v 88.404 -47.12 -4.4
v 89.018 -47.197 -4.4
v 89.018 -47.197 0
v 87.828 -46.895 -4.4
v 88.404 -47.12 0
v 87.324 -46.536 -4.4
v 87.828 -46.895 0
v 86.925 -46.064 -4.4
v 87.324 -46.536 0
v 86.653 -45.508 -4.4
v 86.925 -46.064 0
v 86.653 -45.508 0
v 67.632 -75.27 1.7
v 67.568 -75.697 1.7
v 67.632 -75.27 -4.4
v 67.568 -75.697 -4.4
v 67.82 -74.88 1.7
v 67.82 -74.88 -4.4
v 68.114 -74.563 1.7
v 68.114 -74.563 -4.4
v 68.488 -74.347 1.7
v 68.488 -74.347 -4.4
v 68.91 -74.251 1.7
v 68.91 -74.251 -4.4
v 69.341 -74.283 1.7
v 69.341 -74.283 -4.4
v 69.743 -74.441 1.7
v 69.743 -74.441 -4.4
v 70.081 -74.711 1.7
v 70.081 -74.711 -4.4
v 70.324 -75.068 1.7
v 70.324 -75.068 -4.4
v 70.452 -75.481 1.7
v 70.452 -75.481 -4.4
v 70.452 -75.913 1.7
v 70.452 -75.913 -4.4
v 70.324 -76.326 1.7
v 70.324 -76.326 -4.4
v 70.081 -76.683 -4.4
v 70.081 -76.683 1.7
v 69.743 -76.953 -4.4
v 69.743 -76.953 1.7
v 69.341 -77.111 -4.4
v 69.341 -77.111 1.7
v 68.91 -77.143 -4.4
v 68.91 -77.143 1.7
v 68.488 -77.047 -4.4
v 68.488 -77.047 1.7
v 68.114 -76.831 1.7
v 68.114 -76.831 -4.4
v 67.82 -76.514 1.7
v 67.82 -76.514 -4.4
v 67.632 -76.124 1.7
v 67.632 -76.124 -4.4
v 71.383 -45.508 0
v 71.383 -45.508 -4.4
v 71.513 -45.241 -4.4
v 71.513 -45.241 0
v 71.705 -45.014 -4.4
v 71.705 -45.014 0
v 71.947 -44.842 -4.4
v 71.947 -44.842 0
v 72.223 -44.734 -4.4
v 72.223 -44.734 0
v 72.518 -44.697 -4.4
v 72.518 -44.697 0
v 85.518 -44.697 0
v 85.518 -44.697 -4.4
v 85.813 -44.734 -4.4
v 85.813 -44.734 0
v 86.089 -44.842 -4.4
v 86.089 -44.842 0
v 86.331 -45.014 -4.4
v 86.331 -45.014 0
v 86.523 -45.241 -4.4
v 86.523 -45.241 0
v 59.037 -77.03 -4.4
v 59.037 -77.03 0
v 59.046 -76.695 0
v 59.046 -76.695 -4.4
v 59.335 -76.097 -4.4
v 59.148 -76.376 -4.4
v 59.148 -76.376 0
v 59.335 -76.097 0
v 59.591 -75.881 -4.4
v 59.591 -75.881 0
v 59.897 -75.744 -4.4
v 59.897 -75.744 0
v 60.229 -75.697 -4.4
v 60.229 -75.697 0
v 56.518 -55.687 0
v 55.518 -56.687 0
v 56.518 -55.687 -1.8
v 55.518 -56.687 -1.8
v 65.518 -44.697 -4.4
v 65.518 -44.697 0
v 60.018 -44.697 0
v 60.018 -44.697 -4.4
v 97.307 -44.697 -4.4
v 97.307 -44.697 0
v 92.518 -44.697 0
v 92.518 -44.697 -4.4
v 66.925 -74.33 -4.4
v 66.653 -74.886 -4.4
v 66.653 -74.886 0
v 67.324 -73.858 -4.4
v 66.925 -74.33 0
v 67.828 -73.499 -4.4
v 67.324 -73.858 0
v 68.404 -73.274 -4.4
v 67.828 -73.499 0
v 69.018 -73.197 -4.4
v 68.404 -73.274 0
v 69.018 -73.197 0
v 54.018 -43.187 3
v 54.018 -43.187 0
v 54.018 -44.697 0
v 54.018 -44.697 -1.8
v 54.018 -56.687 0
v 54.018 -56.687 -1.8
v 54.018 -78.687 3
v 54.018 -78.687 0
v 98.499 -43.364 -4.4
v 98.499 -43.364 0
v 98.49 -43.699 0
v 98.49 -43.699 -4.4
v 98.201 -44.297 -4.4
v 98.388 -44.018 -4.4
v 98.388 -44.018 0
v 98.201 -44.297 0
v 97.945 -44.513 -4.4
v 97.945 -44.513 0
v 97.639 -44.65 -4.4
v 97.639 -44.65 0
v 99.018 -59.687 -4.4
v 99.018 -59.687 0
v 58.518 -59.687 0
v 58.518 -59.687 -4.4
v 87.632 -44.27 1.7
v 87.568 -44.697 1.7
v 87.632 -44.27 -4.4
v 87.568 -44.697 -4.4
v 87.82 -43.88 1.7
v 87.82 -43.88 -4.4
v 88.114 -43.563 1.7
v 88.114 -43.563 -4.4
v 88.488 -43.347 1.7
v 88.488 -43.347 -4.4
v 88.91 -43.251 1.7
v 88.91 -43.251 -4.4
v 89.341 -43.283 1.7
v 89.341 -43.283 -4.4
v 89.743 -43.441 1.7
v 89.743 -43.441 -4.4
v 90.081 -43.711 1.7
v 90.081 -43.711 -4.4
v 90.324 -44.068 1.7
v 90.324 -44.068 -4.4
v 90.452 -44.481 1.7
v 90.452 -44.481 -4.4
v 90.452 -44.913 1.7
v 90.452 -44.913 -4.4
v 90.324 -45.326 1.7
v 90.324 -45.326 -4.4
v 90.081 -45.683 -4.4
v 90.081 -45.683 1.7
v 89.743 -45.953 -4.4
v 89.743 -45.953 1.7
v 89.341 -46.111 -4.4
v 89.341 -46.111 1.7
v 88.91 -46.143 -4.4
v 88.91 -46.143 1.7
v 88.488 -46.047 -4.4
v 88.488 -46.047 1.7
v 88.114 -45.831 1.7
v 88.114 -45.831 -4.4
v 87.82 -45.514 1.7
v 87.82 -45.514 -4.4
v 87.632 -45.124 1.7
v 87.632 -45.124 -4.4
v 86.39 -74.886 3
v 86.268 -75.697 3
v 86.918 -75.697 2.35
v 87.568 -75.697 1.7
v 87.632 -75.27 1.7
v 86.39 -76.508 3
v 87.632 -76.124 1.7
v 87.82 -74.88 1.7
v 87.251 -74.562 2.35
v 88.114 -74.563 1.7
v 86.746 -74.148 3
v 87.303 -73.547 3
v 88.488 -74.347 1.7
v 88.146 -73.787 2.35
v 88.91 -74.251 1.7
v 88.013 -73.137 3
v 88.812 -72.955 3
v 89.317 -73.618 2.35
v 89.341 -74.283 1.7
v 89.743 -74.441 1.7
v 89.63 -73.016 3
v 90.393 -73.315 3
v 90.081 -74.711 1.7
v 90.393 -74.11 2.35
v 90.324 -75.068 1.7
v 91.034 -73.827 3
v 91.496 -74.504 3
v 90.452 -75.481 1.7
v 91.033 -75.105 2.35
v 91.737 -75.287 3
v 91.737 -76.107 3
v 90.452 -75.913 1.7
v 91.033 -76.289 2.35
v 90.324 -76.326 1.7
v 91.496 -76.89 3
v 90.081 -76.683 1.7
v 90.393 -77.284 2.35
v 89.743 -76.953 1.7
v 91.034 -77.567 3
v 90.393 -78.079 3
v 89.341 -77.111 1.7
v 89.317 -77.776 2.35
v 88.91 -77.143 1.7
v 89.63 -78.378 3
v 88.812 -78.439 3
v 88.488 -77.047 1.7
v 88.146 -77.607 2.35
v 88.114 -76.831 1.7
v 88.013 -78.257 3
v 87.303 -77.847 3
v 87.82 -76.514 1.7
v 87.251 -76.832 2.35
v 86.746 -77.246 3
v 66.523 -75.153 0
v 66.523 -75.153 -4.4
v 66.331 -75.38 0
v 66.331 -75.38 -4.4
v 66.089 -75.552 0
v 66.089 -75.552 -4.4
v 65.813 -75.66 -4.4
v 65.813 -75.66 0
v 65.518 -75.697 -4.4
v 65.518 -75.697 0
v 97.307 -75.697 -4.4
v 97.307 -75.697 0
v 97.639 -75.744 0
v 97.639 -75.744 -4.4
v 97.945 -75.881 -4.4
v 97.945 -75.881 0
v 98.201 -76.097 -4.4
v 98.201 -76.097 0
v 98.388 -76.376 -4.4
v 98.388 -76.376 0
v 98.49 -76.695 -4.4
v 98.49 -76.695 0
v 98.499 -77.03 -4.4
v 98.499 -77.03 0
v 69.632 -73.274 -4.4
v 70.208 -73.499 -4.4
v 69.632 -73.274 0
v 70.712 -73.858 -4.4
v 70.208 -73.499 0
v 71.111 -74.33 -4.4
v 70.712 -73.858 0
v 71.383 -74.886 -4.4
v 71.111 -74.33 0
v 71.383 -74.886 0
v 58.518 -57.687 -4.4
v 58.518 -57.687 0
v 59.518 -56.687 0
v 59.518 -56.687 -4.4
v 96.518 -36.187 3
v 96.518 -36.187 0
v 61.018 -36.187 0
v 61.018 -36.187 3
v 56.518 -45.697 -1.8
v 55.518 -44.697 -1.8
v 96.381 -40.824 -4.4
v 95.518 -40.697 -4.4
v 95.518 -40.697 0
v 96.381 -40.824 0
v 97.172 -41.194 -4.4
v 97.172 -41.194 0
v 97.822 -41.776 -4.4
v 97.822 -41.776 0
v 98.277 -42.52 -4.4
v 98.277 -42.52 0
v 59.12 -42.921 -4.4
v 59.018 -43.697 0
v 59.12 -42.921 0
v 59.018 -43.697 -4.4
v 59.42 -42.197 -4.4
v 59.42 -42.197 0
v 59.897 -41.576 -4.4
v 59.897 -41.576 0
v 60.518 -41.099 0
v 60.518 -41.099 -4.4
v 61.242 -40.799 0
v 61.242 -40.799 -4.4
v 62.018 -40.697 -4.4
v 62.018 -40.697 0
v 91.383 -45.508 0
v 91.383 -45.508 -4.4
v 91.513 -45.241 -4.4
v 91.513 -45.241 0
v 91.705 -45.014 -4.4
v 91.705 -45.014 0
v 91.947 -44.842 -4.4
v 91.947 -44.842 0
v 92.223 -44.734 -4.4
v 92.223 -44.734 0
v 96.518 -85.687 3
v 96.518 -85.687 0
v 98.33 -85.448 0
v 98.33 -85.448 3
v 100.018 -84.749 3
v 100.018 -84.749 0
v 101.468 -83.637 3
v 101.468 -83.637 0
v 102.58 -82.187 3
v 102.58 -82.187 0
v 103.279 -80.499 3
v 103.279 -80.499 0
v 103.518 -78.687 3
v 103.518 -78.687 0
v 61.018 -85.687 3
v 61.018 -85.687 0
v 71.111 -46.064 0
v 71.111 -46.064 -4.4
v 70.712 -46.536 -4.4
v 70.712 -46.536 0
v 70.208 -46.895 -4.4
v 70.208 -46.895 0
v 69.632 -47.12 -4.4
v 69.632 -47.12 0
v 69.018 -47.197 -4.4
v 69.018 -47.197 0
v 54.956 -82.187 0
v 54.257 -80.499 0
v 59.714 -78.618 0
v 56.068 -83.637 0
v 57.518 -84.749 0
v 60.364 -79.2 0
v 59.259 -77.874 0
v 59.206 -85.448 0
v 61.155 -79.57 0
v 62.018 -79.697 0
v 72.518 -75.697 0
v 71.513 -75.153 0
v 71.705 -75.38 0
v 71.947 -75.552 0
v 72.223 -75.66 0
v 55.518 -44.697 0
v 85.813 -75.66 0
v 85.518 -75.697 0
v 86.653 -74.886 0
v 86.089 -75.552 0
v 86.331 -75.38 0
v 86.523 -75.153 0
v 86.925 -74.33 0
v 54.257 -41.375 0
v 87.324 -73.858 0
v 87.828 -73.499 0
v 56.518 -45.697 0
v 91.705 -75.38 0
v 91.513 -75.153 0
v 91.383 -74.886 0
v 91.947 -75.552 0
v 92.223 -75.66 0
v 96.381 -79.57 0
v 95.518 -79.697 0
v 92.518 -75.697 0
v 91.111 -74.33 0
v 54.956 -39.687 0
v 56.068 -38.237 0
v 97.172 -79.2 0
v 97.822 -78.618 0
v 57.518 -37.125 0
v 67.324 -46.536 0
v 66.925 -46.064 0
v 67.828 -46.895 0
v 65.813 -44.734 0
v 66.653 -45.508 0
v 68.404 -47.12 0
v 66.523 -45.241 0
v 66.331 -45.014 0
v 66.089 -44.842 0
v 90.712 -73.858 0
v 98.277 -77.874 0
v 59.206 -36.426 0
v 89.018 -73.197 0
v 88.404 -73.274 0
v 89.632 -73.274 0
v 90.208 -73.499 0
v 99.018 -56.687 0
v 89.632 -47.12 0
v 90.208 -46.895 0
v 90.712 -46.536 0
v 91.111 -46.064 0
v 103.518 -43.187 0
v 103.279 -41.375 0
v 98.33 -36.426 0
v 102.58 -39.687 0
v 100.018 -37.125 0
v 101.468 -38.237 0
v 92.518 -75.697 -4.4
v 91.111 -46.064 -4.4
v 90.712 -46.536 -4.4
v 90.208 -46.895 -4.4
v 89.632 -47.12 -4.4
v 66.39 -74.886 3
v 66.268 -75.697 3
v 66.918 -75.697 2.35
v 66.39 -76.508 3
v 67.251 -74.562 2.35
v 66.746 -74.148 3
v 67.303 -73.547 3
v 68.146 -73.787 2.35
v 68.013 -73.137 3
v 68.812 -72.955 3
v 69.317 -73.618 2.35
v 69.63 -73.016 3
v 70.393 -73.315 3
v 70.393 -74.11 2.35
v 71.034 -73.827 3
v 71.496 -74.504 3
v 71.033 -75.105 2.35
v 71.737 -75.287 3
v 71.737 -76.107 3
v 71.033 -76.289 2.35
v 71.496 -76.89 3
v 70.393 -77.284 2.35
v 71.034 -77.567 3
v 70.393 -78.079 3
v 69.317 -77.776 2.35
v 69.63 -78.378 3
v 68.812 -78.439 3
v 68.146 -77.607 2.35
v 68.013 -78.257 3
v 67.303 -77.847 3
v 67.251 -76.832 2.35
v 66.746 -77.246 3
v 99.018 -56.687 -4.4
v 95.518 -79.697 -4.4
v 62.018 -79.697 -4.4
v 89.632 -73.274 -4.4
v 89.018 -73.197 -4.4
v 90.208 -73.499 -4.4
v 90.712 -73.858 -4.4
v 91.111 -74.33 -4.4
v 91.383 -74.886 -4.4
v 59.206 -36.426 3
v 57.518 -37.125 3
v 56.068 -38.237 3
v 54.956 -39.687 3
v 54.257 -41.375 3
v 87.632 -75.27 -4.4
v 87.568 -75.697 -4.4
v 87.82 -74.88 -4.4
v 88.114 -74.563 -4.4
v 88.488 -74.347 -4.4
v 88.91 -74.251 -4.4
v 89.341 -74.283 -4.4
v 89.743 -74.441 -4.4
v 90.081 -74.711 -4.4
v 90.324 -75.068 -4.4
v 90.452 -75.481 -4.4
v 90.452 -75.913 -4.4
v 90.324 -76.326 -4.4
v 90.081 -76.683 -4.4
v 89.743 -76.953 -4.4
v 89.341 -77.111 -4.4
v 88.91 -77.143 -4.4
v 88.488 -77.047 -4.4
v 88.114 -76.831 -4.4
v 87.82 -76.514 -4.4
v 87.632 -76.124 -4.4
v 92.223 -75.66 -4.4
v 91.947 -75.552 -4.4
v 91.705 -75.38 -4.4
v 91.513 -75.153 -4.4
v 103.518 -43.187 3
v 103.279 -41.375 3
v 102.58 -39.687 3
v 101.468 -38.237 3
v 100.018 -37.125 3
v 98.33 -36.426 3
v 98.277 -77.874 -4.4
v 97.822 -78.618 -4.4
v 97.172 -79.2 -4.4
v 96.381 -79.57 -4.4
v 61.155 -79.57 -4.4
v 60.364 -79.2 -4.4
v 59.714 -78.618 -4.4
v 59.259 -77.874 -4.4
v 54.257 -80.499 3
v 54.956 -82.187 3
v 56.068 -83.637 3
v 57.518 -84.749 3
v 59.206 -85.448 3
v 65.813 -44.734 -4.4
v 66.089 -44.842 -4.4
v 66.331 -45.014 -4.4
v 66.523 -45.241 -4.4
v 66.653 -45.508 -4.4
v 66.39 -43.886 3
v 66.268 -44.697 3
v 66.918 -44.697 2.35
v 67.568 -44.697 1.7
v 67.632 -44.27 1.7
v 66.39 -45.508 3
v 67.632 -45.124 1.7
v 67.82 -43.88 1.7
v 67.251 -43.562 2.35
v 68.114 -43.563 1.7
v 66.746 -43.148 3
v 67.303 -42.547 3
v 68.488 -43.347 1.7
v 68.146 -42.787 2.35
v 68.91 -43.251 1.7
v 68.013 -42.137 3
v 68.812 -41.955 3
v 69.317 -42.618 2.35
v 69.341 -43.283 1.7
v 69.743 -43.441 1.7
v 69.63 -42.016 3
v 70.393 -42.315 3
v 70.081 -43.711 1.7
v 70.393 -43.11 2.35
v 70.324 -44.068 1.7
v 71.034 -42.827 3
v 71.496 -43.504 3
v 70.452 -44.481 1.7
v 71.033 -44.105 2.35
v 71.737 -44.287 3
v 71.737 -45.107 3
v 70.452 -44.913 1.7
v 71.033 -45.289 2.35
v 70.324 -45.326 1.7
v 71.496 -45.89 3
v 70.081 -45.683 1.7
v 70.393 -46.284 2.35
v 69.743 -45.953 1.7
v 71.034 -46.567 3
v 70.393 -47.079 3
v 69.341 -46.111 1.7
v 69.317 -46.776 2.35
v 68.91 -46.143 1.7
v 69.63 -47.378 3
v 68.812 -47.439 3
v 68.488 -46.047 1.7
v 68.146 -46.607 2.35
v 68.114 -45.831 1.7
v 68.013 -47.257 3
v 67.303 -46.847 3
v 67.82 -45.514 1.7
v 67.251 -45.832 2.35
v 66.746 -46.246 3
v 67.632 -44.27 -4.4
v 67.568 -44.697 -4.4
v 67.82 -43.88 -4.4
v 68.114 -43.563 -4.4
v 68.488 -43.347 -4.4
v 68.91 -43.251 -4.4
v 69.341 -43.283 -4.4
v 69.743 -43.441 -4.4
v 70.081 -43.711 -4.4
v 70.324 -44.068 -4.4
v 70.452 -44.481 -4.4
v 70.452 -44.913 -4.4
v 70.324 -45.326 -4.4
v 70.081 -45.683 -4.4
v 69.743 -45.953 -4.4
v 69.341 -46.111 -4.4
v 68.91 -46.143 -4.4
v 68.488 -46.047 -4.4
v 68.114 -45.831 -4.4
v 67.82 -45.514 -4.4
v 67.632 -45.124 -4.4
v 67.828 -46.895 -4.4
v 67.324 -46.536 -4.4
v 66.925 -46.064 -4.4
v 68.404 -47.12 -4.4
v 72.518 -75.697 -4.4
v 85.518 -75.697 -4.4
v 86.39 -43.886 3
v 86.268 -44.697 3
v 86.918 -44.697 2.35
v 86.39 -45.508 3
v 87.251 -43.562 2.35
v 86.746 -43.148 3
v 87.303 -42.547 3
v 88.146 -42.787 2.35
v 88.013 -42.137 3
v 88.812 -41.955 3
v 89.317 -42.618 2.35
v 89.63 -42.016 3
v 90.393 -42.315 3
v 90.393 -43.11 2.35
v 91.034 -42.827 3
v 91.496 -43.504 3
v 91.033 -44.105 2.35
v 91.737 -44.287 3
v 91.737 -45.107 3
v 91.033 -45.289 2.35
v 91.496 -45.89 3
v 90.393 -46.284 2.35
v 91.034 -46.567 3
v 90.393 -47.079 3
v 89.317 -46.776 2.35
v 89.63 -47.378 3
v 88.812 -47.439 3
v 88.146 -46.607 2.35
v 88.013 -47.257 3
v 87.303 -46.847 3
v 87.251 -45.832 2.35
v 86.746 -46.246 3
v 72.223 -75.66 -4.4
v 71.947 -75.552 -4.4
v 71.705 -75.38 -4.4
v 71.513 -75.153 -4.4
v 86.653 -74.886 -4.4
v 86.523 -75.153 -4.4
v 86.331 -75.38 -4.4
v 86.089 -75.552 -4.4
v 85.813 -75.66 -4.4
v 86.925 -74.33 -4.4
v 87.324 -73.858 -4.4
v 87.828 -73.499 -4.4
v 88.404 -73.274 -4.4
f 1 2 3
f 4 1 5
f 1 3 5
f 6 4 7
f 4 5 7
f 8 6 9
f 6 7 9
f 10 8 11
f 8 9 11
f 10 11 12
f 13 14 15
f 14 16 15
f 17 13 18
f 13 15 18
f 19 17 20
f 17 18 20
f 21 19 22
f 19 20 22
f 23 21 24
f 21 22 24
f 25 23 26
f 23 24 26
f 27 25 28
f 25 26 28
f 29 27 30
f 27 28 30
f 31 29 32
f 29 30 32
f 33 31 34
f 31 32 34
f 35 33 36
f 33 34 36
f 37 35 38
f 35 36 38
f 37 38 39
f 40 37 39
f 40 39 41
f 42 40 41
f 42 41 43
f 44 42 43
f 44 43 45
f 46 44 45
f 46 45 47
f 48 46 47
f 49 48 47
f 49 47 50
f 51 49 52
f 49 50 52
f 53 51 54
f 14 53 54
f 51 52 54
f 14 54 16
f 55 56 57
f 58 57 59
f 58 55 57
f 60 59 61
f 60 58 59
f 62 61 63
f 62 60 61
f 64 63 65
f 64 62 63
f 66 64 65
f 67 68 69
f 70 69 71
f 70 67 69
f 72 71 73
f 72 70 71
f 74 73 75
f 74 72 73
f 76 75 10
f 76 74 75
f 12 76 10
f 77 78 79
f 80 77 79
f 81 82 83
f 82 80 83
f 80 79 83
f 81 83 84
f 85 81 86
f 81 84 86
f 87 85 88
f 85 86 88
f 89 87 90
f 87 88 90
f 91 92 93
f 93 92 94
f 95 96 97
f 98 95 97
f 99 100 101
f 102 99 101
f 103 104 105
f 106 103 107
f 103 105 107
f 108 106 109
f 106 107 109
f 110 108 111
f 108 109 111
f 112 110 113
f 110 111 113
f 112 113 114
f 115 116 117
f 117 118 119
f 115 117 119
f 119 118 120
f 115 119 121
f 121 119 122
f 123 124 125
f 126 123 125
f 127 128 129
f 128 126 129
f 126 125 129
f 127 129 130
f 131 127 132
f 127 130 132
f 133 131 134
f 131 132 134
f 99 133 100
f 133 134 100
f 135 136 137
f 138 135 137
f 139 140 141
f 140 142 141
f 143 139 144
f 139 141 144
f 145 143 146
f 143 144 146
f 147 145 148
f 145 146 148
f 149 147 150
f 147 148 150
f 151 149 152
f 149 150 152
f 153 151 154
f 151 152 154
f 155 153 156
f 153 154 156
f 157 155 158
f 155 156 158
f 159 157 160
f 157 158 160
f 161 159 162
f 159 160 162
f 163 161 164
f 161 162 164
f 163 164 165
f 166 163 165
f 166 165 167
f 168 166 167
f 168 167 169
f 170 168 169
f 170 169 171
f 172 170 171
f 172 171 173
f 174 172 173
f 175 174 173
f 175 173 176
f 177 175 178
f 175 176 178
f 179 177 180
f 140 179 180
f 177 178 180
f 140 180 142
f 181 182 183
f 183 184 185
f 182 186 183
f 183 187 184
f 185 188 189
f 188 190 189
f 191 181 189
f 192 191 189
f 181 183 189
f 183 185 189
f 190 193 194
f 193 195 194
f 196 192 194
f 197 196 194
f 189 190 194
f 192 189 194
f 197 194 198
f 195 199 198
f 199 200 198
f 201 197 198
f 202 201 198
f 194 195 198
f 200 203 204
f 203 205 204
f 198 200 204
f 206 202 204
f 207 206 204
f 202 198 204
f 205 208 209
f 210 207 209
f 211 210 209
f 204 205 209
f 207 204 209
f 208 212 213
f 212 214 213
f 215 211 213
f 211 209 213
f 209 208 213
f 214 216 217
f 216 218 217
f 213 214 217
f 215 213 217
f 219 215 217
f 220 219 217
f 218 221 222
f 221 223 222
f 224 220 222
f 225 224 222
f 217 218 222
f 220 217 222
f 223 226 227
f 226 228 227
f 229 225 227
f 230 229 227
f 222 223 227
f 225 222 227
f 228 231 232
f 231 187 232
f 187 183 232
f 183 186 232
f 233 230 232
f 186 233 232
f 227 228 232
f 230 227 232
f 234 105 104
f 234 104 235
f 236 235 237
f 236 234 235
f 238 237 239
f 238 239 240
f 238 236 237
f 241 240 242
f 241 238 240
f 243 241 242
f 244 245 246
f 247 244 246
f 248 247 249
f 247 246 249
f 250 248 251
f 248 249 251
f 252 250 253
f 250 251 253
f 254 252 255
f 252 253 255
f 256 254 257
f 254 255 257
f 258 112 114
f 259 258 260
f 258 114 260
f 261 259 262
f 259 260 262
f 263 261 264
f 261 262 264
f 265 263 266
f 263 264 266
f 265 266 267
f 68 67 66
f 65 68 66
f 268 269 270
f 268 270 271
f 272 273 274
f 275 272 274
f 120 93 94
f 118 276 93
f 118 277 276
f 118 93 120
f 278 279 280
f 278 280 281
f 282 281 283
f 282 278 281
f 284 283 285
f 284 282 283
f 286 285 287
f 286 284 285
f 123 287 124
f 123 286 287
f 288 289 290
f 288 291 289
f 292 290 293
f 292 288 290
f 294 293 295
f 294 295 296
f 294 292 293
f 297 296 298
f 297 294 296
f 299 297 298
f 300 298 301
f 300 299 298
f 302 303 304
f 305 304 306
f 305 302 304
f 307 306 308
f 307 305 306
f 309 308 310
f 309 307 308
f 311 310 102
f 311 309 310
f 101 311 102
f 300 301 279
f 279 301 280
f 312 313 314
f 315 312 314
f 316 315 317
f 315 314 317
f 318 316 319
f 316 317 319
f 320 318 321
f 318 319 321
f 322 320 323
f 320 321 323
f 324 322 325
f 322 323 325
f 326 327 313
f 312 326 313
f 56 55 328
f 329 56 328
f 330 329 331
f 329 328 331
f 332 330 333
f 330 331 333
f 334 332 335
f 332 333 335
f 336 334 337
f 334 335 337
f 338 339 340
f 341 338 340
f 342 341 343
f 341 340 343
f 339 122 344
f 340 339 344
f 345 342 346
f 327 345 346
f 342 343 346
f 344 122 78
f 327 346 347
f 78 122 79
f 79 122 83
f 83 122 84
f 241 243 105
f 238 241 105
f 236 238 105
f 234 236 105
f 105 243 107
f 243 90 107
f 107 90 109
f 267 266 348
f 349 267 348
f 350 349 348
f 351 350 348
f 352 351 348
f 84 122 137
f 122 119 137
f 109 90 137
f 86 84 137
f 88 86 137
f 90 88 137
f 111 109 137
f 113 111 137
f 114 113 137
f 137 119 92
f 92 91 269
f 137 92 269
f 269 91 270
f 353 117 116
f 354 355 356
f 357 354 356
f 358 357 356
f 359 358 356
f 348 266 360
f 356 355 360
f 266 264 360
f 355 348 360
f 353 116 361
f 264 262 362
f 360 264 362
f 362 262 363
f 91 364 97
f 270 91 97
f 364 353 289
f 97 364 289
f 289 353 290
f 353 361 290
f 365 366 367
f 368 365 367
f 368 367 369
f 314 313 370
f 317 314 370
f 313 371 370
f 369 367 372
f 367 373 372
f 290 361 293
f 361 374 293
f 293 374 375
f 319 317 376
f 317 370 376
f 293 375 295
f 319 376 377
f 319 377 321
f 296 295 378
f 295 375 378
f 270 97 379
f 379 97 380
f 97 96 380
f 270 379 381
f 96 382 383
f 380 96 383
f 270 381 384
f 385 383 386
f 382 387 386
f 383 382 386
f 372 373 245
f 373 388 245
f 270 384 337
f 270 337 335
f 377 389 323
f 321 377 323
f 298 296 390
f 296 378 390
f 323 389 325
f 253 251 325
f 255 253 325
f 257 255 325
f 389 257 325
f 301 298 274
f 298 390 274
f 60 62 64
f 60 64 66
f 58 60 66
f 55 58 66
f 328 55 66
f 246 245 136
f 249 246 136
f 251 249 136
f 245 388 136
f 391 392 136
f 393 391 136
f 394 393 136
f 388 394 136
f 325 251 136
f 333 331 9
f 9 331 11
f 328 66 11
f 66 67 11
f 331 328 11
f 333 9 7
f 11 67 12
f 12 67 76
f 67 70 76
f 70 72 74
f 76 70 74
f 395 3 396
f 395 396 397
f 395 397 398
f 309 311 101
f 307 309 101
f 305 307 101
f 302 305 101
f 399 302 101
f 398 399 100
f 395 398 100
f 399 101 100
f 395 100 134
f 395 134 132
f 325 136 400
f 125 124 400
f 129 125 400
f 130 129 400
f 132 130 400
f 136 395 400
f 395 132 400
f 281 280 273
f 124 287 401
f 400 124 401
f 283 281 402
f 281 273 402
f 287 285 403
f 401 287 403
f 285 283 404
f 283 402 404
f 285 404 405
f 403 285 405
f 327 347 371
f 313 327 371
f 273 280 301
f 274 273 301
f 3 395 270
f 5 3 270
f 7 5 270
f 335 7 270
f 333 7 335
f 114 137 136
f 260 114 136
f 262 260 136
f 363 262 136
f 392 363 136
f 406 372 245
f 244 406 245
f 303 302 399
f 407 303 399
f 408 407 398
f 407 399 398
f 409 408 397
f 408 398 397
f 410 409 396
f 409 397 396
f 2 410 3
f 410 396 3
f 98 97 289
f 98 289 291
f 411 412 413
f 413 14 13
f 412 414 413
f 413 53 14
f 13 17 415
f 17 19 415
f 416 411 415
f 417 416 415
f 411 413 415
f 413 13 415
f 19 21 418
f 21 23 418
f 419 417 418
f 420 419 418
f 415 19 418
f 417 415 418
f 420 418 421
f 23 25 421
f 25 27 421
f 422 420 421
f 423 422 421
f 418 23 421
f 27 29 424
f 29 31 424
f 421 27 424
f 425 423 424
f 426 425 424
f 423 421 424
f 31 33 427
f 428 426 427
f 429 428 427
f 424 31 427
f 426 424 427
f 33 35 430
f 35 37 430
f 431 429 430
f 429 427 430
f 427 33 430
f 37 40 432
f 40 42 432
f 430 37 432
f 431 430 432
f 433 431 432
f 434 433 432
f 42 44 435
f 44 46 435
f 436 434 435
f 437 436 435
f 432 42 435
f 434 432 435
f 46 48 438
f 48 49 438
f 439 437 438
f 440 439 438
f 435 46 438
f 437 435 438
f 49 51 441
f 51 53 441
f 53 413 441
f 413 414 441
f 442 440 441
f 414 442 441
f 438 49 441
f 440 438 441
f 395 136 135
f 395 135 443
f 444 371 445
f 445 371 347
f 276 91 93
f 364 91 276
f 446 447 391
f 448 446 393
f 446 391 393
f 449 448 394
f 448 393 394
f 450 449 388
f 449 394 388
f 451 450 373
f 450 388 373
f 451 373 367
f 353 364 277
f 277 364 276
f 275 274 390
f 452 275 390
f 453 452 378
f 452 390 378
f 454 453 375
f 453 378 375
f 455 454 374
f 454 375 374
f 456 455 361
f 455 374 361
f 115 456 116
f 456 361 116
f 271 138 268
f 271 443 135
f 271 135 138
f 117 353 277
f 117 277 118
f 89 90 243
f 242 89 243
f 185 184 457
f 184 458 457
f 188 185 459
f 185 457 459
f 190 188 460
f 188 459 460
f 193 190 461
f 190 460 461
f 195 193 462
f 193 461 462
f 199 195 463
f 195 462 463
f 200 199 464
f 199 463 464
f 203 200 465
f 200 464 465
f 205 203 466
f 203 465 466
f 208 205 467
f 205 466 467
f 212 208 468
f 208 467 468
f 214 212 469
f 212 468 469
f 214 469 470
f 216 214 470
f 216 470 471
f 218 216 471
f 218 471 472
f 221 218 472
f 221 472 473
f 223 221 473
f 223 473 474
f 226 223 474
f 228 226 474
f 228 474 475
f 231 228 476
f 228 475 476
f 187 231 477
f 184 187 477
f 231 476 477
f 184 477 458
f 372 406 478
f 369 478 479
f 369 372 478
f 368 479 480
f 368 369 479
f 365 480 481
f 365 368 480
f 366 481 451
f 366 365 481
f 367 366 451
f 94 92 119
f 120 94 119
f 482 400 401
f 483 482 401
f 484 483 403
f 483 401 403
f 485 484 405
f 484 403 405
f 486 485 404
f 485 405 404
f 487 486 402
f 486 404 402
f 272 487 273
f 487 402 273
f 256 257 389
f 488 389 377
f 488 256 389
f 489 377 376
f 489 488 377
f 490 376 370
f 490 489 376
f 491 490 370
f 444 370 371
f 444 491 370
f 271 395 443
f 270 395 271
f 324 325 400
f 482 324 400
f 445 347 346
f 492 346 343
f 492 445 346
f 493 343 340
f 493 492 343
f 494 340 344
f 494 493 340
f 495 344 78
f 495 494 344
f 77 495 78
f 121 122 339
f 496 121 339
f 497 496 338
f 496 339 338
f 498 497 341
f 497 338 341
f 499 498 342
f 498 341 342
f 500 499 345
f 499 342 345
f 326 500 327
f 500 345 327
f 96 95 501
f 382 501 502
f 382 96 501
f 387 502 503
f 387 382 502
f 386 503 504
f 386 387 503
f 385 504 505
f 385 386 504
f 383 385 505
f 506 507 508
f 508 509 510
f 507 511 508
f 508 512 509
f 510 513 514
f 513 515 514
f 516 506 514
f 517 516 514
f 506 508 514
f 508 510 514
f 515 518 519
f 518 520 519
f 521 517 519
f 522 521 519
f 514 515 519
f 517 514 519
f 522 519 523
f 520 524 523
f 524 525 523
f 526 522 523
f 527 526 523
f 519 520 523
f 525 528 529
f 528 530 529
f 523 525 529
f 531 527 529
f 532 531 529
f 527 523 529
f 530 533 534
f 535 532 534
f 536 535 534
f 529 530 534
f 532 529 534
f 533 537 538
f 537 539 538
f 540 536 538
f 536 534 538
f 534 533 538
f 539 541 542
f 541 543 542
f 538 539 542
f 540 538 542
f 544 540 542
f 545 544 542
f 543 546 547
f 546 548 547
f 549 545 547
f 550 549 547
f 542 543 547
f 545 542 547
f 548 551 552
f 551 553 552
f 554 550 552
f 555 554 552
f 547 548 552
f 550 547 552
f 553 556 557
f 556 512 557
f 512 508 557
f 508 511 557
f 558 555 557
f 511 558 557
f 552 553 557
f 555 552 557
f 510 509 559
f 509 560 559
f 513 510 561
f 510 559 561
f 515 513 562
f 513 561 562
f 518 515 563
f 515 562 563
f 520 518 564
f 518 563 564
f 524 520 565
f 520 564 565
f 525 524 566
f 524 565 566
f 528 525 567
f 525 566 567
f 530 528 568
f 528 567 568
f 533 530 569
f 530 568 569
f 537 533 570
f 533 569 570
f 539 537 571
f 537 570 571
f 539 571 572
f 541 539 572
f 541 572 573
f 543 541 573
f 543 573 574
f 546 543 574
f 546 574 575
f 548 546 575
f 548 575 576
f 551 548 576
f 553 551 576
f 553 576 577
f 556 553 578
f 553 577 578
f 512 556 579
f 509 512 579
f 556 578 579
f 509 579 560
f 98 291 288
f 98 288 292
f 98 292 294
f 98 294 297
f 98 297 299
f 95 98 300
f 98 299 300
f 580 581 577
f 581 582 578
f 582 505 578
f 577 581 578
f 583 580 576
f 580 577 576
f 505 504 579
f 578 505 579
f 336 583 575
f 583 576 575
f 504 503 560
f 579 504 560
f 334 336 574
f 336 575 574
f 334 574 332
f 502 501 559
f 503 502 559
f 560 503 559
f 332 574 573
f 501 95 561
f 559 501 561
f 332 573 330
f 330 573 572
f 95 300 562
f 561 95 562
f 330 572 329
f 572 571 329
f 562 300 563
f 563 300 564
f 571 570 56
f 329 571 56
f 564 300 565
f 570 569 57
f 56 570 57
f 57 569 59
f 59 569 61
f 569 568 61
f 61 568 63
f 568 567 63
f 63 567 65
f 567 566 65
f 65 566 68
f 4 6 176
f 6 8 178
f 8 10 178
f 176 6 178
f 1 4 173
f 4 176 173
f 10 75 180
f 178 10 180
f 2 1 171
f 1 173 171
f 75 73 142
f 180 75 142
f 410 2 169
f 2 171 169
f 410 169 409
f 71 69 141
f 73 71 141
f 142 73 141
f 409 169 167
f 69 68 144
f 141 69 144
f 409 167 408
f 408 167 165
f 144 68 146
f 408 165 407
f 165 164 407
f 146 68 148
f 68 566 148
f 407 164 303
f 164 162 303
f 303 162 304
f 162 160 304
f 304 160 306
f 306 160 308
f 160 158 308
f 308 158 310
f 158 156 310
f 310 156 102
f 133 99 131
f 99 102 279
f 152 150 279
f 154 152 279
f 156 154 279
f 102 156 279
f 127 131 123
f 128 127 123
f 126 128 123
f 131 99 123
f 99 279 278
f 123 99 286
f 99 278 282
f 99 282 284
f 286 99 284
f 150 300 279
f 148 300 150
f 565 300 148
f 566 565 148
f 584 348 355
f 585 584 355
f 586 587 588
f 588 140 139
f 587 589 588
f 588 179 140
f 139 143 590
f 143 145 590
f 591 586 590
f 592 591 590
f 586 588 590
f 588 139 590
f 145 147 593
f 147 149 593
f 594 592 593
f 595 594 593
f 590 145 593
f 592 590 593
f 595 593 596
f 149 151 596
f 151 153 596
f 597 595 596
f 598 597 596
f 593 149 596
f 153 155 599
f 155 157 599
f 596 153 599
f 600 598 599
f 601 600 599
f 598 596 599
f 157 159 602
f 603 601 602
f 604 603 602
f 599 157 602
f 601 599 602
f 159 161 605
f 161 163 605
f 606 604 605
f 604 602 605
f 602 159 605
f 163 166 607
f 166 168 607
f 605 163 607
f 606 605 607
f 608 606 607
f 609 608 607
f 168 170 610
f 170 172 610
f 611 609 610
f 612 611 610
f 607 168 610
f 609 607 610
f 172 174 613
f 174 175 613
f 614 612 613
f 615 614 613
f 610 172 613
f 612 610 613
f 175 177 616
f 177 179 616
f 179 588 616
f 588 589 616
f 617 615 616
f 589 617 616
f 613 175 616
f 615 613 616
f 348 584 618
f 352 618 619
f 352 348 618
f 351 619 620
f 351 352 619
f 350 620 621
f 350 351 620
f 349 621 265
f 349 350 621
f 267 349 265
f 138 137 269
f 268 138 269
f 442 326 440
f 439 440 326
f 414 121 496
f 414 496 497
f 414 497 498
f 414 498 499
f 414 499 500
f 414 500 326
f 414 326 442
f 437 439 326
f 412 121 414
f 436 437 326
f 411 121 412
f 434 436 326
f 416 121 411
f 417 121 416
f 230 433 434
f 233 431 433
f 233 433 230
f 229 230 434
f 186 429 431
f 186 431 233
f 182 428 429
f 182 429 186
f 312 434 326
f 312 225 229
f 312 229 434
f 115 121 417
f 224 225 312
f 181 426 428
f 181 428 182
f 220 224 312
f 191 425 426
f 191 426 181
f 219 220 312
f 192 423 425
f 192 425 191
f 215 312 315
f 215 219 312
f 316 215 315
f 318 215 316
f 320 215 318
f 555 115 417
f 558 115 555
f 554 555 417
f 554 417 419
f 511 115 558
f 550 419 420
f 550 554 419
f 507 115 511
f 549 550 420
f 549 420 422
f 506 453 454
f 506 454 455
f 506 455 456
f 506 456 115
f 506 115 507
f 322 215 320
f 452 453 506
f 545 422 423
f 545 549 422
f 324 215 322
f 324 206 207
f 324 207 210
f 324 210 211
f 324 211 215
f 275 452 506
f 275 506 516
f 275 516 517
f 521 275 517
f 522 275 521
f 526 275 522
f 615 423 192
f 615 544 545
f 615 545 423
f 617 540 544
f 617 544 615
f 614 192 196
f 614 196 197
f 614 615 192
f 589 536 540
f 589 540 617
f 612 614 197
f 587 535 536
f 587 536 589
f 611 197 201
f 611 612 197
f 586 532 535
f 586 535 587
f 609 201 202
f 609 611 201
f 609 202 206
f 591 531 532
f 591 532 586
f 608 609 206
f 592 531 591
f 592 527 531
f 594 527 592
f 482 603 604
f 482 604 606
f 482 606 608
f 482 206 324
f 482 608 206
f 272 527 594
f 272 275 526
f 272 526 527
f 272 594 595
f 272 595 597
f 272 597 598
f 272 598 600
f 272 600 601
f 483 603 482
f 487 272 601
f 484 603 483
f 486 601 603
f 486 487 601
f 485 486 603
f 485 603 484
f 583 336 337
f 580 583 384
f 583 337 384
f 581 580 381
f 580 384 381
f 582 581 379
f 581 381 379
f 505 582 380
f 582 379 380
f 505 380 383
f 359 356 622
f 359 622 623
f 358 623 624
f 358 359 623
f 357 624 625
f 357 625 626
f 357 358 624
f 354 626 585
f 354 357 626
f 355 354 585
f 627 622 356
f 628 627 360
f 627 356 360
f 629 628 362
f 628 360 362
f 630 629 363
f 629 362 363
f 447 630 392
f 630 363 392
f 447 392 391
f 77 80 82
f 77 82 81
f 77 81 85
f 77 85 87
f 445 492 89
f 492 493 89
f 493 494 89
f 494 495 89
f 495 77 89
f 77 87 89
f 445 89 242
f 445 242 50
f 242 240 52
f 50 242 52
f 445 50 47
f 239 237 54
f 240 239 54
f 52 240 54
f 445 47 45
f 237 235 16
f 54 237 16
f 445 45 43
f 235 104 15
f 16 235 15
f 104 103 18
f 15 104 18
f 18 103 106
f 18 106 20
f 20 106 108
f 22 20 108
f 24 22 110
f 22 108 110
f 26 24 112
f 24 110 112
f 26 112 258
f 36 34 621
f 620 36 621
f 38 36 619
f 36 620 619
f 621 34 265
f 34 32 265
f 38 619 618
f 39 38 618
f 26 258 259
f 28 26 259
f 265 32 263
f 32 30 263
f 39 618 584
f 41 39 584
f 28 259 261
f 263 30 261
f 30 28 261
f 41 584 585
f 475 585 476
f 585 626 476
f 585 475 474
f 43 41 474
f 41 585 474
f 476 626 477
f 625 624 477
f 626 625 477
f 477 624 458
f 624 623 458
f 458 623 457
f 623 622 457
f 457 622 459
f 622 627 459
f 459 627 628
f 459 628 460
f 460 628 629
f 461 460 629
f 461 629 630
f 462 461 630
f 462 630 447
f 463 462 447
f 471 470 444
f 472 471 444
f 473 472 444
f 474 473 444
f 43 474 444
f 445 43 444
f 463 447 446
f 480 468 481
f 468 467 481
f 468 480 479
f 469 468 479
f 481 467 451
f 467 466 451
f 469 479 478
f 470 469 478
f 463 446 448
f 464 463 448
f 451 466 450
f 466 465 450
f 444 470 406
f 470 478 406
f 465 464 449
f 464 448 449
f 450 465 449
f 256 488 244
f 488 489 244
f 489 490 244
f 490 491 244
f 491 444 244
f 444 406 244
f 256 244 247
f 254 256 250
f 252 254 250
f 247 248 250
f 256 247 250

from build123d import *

# Parameters (mm, degrees)
EXTRUDE_1_DEPTH                = 3
SKETCH_3_W                     = 40.5
SKETCH_3_H                     = 3
EXTRUDE_3_DEPTH                = 4.4
EXTRUDE_6_DEPTH                = 4.4
SKETCH_2_W                     = 2.5
SKETCH_2_H                     = 11.99
EXTRUDE_2_DEPTH                = 1.8
FILLET_1_R                     = 3
FILLET_2_R                     = 1.2
HOLE_WIZARD_M2_5_1_D           = 2.9
HOLE_WIZARD_M2_5_1_CSINK_D     = 5.5
HOLE_WIZARD_M2_5_1_CSINK_ANGLE = 90
CHAMFER_3_SIZE                 = 1


# Some blends are built 0.0001 mm under size
with BuildPart() as part:
    # 草图1 → 凸台-拉伸1 (new body)
    with BuildSketch(Plane.XY):
        with BuildLine():
            Line((96.518, -36.187), (61.018, -36.187))
            ThreePointArc((61.018, -36.187), (56.068252532, -38.237252532), (54.018, -43.187))
            Line((54.018, -43.187), (54.018, -78.687))
            ThreePointArc((54.018, -78.687), (56.068252532, -83.636747468), (61.018, -85.687))
            Line((61.018, -85.687), (96.518, -85.687))
            ThreePointArc((96.518, -85.687), (101.467747468, -83.636747468), (103.518, -78.687))
            Line((103.518, -78.687), (103.518, -43.187))
            ThreePointArc((103.518, -43.187), (101.467747468, -38.237252532), (96.518, -36.187))
        make_face()
    extrude(amount=EXTRUDE_1_DEPTH)

    # 草图3 → 凸台-拉伸3 (add)
    with BuildSketch(Plane(origin=(0, 0, 0), x_dir=(-1, 0, 0), z_dir=(0, 0, -1))):
        with Locations((-78.768, -58.187)):
            Rectangle(SKETCH_3_W, SKETCH_3_H)
    extrude(amount=EXTRUDE_3_DEPTH)

    # 草图4 → 凸台-拉伸6 (add)
    with BuildSketch(Plane(origin=(0, 0, 0), x_dir=(-1, 0, 0), z_dir=(0, 0, -1))):
        with BuildLine():
            Line((-79.018, -44.697), (-79.018, -40.697))
            Line((-79.018, -40.697), (-98.518, -40.697))
            Line((-98.518, -40.697), (-98.518, -44.697))
            Line((-98.518, -44.697), (-91.518, -44.697))
            ThreePointArc((-91.518, -44.697), (-89.018, -42.197), (-86.518, -44.697))
            Line((-86.518, -44.697), (-79.018, -44.697))
        make_face()
        with BuildLine():
            Line((-59.018, -40.697), (-79.018, -40.697))
            Line((-79.018, -40.697), (-79.018, -44.697))
            Line((-79.018, -44.697), (-71.518, -44.697))
            ThreePointArc((-71.518, -44.697), (-69.018, -42.197), (-66.518, -44.697))
            Line((-66.518, -44.697), (-59.018, -44.697))
            Line((-59.018, -44.697), (-59.018, -40.697))
        make_face()
        with BuildLine():
            ThreePointArc((-89.018, -47.197), (-87.250233047, -46.464766953), (-86.518, -44.697))
            Line((-86.518, -44.697), (-87.718, -44.697))
            ThreePointArc((-87.718, -44.697), (-88.098761184, -45.616238816), (-89.018, -45.997))
            Line((-89.018, -45.997), (-89.018, -47.197))
        make_face()
        with BuildLine():
            Line((-90.318, -44.697), (-91.518, -44.697))
            ThreePointArc((-91.518, -44.697), (-90.785766953, -46.464766953), (-89.018, -47.197))
            Line((-89.018, -47.197), (-89.018, -45.997))
            ThreePointArc((-89.018, -45.997), (-89.937238816, -45.616238816), (-90.318, -44.697))
        make_face()
        with BuildLine():
            Line((-87.718, -44.697), (-86.518, -44.697))
            ThreePointArc((-86.518, -44.697), (-89.018, -42.197), (-91.518, -44.697))
            Line((-91.518, -44.697), (-90.318, -44.697))
            ThreePointArc((-90.318, -44.697), (-89.018, -43.397), (-87.718, -44.697))
        make_face()
        with BuildLine():
            ThreePointArc((-66.518, -44.697), (-69.018, -42.197), (-71.518, -44.697))
            Line((-71.518, -44.697), (-70.318, -44.697))
            ThreePointArc((-70.318, -44.697), (-69.018, -43.397), (-67.718, -44.697))
            Line((-67.718, -44.697), (-66.518, -44.697))
        make_face()
        with BuildLine():
            Line((-70.318, -44.697), (-71.518, -44.697))
            ThreePointArc((-71.518, -44.697), (-70.785766953, -46.464766953), (-69.018, -47.197))
            Line((-69.018, -47.197), (-69.018, -45.997))
            ThreePointArc((-69.018, -45.997), (-69.937238816, -45.616238816), (-70.318, -44.697))
        make_face()
        with BuildLine():
            ThreePointArc((-69.018, -47.197), (-67.250233047, -46.464766953), (-66.518, -44.697))
            Line((-66.518, -44.697), (-67.718, -44.697))
            ThreePointArc((-67.718, -44.697), (-68.098761184, -45.616238816), (-69.018, -45.997))
            Line((-69.018, -45.997), (-69.018, -47.197))
        make_face()
        with BuildLine():
            ThreePointArc((-69.018, -73.197), (-70.785766953, -73.929233047), (-71.518, -75.697))
            Line((-71.518, -75.697), (-70.318, -75.697))
            ThreePointArc((-70.318, -75.697), (-69.937238816, -74.777761184), (-69.018, -74.397))
            Line((-69.018, -74.397), (-69.018, -73.197))
        make_face()
        with BuildLine():
            ThreePointArc((-66.518, -75.697), (-67.250233047, -73.929233047), (-69.018, -73.197))
            Line((-69.018, -73.197), (-69.018, -74.397))
            ThreePointArc((-69.018, -74.397), (-68.098761184, -74.777761184), (-67.718, -75.697))
            Line((-67.718, -75.697), (-66.518, -75.697))
        make_face()
        with BuildLine():
            Line((-70.318, -75.697), (-71.518, -75.697))
            ThreePointArc((-71.518, -75.697), (-69.018, -78.197), (-66.518, -75.697))
            Line((-66.518, -75.697), (-67.718, -75.697))
            ThreePointArc((-67.718, -75.697), (-69.018, -76.997), (-70.318, -75.697))
        make_face()
        with BuildLine():
            Line((-71.518, -75.697), (-79.018, -75.697))
            Line((-79.018, -75.697), (-79.018, -79.697))
            Line((-79.018, -79.697), (-59.018, -79.697))
            Line((-59.018, -79.697), (-59.018, -75.697))
            Line((-59.018, -75.697), (-66.518, -75.697))
            ThreePointArc((-66.518, -75.697), (-69.018, -78.197), (-71.518, -75.697))
        make_face()
        with BuildLine():
            Line((-79.018, -79.697), (-79.018, -75.697))
            Line((-79.018, -75.697), (-86.518, -75.697))
            ThreePointArc((-86.518, -75.697), (-89.018, -78.197), (-91.518, -75.697))
            Line((-91.518, -75.697), (-98.518, -75.697))
            Line((-98.518, -75.697), (-98.518, -79.697))
            Line((-98.518, -79.697), (-79.018, -79.697))
        make_face()
        with BuildLine():
            ThreePointArc((-91.518, -75.697), (-89.018, -78.197), (-86.518, -75.697))
            Line((-86.518, -75.697), (-87.718, -75.697))
            ThreePointArc((-87.718, -75.697), (-89.018, -76.997), (-90.318, -75.697))
            Line((-90.318, -75.697), (-91.518, -75.697))
        make_face()
        with BuildLine():
            Line((-87.718, -75.697), (-86.518, -75.697))
            ThreePointArc((-86.518, -75.697), (-87.250233047, -73.929233047), (-89.018, -73.197))
            Line((-89.018, -73.197), (-89.018, -74.397))
            ThreePointArc((-89.018, -74.397), (-88.098761184, -74.777761184), (-87.718, -75.697))
        make_face()
        with BuildLine():
            Line((-89.018, -74.397), (-89.018, -73.197))
            ThreePointArc((-89.018, -73.197), (-90.785766953, -73.929233047), (-91.518, -75.697))
            Line((-91.518, -75.697), (-90.318, -75.697))
            ThreePointArc((-90.318, -75.697), (-89.937238816, -74.777761184), (-89.018, -74.397))
        make_face()
    extrude(amount=EXTRUDE_6_DEPTH)

    # 草图2 → 凸台-拉伸2 (add)
    with BuildSketch(Plane(origin=(0, 0, 0), x_dir=(-1, 0, 0), z_dir=(0, 0, -1))):
        with Locations((-55.268, -50.692)):
            Rectangle(SKETCH_2_W, SKETCH_2_H)
    extrude(amount=EXTRUDE_2_DEPTH)

    # 圆角1
    fillet_1_edges = [part.edges().sort_by_distance(p)[0] for p in [
        (59.018, -40.697, -2.2),
        (98.518, -40.697, -2.2),
        (59.018, -79.697, -2.2),
        (98.518, -79.697, -2.2),
    ]]
    fillet(fillet_1_edges, radius=FILLET_1_R)

    # 圆角2
    # the kernel refuses this fillet: 1.2 mm, written as the material it adds along each edge
    with BuildSketch(Plane(origin=(91.518, -44.697, 2.5), x_dir=(-0.16439898730516103, -0.9863939238321764, 0), z_dir=(0, 0, -1)), Plane(origin=(71.518, -44.697, 2.5), x_dir=(-0.16439898730516103, -0.9863939238321764, 0), z_dir=(0, 0, -1))) as fillet_2_piece_1:
        with BuildLine():
            CenterArc((1.019273721, -1.183672709), FILLET_2_R, 99.462322208, 71.075355584)
            Line((-0.164398987, -0.986393924), (0, 0))
            ThreePointArc((0, 0), (0.410997468, -0.03401519), (0.821994937, 0))
        make_face()
    extrude(amount=6.9)
    with BuildSketch(Plane(origin=(86.518, -44.697, 2.5), x_dir=(-1, 0, 0), z_dir=(0, 0, -1)), Plane(origin=(66.518, -44.697, 2.5), x_dir=(-1, 0, 0), z_dir=(0, 0, -1))) as fillet_2_piece_2:
        with BuildLine():
            CenterArc((1, -1.2), FILLET_2_R, 90, 71.075355584)
            ThreePointArc((-0.135135135, -0.810810811), (-0.03401519, -0.410997468), (0, 0))
            Line((0, 0), (1, 0))
        make_face()
    extrude(amount=6.9)
    with BuildSketch(Plane(origin=(71.518, -75.697, 2.5), x_dir=(-0.16439898730513022, 0.9863939238321816, 0), z_dir=(0, 0, -1)), Plane(origin=(91.518, -75.697, 2.5), x_dir=(-0.16439898730515545, 0.9863939238321774, 0), z_dir=(0, 0, -1))) as fillet_2_piece_3:
        with BuildLine():
            CenterArc((1.019273721, 1.183672709), FILLET_2_R, 189.462322208, 71.075355584)
            Line((-0.164398987, 0.986393924), (0, 0))
            ThreePointArc((0, 0), (0.410997468, 0.03401519), (0.821994937, 0))
        make_face()
    extrude(amount=6.9)
    with BuildSketch(Plane(origin=(66.518, -75.697, 2.5), x_dir=(-1, 0, 0), z_dir=(0, 0, -1)), Plane(origin=(86.518, -75.697, 2.5), x_dir=(-1, 0, 0), z_dir=(0, 0, -1))) as fillet_2_piece_4:
        with BuildLine():
            CenterArc((1, 1.2), FILLET_2_R, 198.924644416, 71.075355584)
            ThreePointArc((-0.135135135, 0.810810811), (-0.03401519, 0.410997468), (0, 0))
            Line((0, 0), (1, 0))
        make_face()
    extrude(amount=6.9)
    # the kernel refuses this fillet: 1.2 mm, written as the material it takes off along each edge
    with BuildSketch(Plane(origin=(59.018, -76.697, -4.4), x_dir=(0, 0, 1), z_dir=(0, 1, 0))) as fillet_2_2_piece_1_section:
        with BuildLine():
            CenterArc((FILLET_2_R, FILLET_2_R), FILLET_2_R, 180, 90)
            Line((0, FILLET_2_R), (0, 0))
            Line((0, 0), (FILLET_2_R, 0))
        make_face()
    fillet_2_2_piece_1 = extrude(amount=4, mode=Mode.PRIVATE)
    fillet_2_2_piece_1 = fillet_2_2_piece_1 - Plane(origin=(62.018, -76.697, -3.946727239), x_dir=(-1, 0, 0), z_dir=(0, 0, -1)) * Cylinder(3, 13, mode=Mode.PRIVATE)
    add(fillet_2_2_piece_1, mode=Mode.SUBTRACT)
    with BuildSketch(Plane(origin=(98.518, -72.697, -4.4), x_dir=(0, 0, 1), z_dir=(0, -1, 0))) as fillet_2_2_piece_2_section:
        with BuildLine():
            CenterArc((FILLET_2_R, FILLET_2_R), FILLET_2_R, 180, 90)
            Line((0, FILLET_2_R), (0, 0))
            Line((0, 0), (FILLET_2_R, 0))
        make_face()
    fillet_2_2_piece_2 = extrude(amount=4, mode=Mode.PRIVATE)
    fillet_2_2_piece_2 = fillet_2_2_piece_2 - Plane(origin=(95.518, -76.697, -3.946727241), x_dir=(0, -1, 0), z_dir=(0, 0, -1)) * Cylinder(3, 13, mode=Mode.PRIVATE)
    add(fillet_2_2_piece_2, mode=Mode.SUBTRACT)
    with BuildSketch(Plane(origin=(98.518, -43.697, -4.4), x_dir=(0, 0, 1), z_dir=(0, -1, 0))) as fillet_2_2_piece_3_section:
        with BuildLine():
            CenterArc((FILLET_2_R, FILLET_2_R), FILLET_2_R, 180, 90)
            Line((0, FILLET_2_R), (0, 0))
            Line((0, 0), (FILLET_2_R, 0))
        make_face()
    fillet_2_2_piece_3 = extrude(amount=4, mode=Mode.PRIVATE)
    fillet_2_2_piece_3 = fillet_2_2_piece_3 - Plane(origin=(95.518, -43.697, -3.946727241), x_dir=(0, 1, 0), z_dir=(0, 0, -1)) * Cylinder(3, 13, mode=Mode.PRIVATE)
    add(fillet_2_2_piece_3, mode=Mode.SUBTRACT)
    with BuildSketch(Plane(origin=(98.518, -44.697, 0), x_dir=(-1, 0, 0), z_dir=(0, 0, -1)), Plane(origin=(59.018, -75.697, 0), x_dir=(1, 0, 0), z_dir=(0, 0, -1))) as fillet_2_2_piece_4:
        with BuildLine():
            CenterArc((1.211145618, 1.2), FILLET_2_R, 173.620629792, 96.379370208)
            Line((0.01857603, 1.333333333), (-0.100680929, 1.346666667))
            ThreePointArc((-0.100680929, 1.346666667), (-0.12, 1), (-0.12, 0))
            Line((-0.12, 0), (0, -0.12))
            Line((0, -0.12), (1.211145618, -0.12))
            Line((1.211145618, -0.12), (1.211145618, 0))
        make_face()
    extrude(amount=7.73365682, mode=Mode.SUBTRACT)
    with BuildSketch(Plane(origin=(98.518, -75.697, 0), x_dir=(-0.013930670585512008, -0.9999029635004779, 0), z_dir=(0, 0, -1))) as fillet_2_2_piece_5:
        with BuildLine():
            CenterArc((1.216755627, 1.194311288), FILLET_2_R, 179.201805551, 96.379370208)
            Line((0.016872071, 1.211028093), (-0.103116285, 1.212699773))
            Line((-0.103116285, 1.212699773), (-0.119988356, 0.00167168))
            Line((-0.119988356, 0.00167168), (-0.00167168, -0.119988356))
            ThreePointArc((-0.00167168, -0.119988356), (0.998231283, -0.133919026), (1.345133438, -0.119431129))
            Line((1.345133438, -0.119431129), (1.333462728, 0))
        make_face()
    extrude(amount=7.73365682, mode=Mode.SUBTRACT)

    # M2.5 平头机械螺钉的锥形沉头孔1 (through all)
    with Locations(Plane.XY.offset(3)):
        with Locations((69.018, -44.697), (69.018, -75.697), (89.018, -75.697), (89.018, -44.697)):
            CounterSinkHole(HOLE_WIZARD_M2_5_1_D / 2, HOLE_WIZARD_M2_5_1_CSINK_D / 2, counter_sink_angle=HOLE_WIZARD_M2_5_1_CSINK_ANGLE)

    # 倒角3
    chamfer_3_edges = [part.edges().sort_by_distance(p)[0] for p in [
        (59.018, -44.697, -2.2),
        (56.518, -44.697, -0.9),
        (56.518, -56.687, -0.9),
        (58.518, -56.687, -2.2),
    ]]
    chamfer(chamfer_3_edges, length=CHAMFER_3_SIZE - 0.0001)  # a hair under: the kernel refuses the full size


solid = part.part
